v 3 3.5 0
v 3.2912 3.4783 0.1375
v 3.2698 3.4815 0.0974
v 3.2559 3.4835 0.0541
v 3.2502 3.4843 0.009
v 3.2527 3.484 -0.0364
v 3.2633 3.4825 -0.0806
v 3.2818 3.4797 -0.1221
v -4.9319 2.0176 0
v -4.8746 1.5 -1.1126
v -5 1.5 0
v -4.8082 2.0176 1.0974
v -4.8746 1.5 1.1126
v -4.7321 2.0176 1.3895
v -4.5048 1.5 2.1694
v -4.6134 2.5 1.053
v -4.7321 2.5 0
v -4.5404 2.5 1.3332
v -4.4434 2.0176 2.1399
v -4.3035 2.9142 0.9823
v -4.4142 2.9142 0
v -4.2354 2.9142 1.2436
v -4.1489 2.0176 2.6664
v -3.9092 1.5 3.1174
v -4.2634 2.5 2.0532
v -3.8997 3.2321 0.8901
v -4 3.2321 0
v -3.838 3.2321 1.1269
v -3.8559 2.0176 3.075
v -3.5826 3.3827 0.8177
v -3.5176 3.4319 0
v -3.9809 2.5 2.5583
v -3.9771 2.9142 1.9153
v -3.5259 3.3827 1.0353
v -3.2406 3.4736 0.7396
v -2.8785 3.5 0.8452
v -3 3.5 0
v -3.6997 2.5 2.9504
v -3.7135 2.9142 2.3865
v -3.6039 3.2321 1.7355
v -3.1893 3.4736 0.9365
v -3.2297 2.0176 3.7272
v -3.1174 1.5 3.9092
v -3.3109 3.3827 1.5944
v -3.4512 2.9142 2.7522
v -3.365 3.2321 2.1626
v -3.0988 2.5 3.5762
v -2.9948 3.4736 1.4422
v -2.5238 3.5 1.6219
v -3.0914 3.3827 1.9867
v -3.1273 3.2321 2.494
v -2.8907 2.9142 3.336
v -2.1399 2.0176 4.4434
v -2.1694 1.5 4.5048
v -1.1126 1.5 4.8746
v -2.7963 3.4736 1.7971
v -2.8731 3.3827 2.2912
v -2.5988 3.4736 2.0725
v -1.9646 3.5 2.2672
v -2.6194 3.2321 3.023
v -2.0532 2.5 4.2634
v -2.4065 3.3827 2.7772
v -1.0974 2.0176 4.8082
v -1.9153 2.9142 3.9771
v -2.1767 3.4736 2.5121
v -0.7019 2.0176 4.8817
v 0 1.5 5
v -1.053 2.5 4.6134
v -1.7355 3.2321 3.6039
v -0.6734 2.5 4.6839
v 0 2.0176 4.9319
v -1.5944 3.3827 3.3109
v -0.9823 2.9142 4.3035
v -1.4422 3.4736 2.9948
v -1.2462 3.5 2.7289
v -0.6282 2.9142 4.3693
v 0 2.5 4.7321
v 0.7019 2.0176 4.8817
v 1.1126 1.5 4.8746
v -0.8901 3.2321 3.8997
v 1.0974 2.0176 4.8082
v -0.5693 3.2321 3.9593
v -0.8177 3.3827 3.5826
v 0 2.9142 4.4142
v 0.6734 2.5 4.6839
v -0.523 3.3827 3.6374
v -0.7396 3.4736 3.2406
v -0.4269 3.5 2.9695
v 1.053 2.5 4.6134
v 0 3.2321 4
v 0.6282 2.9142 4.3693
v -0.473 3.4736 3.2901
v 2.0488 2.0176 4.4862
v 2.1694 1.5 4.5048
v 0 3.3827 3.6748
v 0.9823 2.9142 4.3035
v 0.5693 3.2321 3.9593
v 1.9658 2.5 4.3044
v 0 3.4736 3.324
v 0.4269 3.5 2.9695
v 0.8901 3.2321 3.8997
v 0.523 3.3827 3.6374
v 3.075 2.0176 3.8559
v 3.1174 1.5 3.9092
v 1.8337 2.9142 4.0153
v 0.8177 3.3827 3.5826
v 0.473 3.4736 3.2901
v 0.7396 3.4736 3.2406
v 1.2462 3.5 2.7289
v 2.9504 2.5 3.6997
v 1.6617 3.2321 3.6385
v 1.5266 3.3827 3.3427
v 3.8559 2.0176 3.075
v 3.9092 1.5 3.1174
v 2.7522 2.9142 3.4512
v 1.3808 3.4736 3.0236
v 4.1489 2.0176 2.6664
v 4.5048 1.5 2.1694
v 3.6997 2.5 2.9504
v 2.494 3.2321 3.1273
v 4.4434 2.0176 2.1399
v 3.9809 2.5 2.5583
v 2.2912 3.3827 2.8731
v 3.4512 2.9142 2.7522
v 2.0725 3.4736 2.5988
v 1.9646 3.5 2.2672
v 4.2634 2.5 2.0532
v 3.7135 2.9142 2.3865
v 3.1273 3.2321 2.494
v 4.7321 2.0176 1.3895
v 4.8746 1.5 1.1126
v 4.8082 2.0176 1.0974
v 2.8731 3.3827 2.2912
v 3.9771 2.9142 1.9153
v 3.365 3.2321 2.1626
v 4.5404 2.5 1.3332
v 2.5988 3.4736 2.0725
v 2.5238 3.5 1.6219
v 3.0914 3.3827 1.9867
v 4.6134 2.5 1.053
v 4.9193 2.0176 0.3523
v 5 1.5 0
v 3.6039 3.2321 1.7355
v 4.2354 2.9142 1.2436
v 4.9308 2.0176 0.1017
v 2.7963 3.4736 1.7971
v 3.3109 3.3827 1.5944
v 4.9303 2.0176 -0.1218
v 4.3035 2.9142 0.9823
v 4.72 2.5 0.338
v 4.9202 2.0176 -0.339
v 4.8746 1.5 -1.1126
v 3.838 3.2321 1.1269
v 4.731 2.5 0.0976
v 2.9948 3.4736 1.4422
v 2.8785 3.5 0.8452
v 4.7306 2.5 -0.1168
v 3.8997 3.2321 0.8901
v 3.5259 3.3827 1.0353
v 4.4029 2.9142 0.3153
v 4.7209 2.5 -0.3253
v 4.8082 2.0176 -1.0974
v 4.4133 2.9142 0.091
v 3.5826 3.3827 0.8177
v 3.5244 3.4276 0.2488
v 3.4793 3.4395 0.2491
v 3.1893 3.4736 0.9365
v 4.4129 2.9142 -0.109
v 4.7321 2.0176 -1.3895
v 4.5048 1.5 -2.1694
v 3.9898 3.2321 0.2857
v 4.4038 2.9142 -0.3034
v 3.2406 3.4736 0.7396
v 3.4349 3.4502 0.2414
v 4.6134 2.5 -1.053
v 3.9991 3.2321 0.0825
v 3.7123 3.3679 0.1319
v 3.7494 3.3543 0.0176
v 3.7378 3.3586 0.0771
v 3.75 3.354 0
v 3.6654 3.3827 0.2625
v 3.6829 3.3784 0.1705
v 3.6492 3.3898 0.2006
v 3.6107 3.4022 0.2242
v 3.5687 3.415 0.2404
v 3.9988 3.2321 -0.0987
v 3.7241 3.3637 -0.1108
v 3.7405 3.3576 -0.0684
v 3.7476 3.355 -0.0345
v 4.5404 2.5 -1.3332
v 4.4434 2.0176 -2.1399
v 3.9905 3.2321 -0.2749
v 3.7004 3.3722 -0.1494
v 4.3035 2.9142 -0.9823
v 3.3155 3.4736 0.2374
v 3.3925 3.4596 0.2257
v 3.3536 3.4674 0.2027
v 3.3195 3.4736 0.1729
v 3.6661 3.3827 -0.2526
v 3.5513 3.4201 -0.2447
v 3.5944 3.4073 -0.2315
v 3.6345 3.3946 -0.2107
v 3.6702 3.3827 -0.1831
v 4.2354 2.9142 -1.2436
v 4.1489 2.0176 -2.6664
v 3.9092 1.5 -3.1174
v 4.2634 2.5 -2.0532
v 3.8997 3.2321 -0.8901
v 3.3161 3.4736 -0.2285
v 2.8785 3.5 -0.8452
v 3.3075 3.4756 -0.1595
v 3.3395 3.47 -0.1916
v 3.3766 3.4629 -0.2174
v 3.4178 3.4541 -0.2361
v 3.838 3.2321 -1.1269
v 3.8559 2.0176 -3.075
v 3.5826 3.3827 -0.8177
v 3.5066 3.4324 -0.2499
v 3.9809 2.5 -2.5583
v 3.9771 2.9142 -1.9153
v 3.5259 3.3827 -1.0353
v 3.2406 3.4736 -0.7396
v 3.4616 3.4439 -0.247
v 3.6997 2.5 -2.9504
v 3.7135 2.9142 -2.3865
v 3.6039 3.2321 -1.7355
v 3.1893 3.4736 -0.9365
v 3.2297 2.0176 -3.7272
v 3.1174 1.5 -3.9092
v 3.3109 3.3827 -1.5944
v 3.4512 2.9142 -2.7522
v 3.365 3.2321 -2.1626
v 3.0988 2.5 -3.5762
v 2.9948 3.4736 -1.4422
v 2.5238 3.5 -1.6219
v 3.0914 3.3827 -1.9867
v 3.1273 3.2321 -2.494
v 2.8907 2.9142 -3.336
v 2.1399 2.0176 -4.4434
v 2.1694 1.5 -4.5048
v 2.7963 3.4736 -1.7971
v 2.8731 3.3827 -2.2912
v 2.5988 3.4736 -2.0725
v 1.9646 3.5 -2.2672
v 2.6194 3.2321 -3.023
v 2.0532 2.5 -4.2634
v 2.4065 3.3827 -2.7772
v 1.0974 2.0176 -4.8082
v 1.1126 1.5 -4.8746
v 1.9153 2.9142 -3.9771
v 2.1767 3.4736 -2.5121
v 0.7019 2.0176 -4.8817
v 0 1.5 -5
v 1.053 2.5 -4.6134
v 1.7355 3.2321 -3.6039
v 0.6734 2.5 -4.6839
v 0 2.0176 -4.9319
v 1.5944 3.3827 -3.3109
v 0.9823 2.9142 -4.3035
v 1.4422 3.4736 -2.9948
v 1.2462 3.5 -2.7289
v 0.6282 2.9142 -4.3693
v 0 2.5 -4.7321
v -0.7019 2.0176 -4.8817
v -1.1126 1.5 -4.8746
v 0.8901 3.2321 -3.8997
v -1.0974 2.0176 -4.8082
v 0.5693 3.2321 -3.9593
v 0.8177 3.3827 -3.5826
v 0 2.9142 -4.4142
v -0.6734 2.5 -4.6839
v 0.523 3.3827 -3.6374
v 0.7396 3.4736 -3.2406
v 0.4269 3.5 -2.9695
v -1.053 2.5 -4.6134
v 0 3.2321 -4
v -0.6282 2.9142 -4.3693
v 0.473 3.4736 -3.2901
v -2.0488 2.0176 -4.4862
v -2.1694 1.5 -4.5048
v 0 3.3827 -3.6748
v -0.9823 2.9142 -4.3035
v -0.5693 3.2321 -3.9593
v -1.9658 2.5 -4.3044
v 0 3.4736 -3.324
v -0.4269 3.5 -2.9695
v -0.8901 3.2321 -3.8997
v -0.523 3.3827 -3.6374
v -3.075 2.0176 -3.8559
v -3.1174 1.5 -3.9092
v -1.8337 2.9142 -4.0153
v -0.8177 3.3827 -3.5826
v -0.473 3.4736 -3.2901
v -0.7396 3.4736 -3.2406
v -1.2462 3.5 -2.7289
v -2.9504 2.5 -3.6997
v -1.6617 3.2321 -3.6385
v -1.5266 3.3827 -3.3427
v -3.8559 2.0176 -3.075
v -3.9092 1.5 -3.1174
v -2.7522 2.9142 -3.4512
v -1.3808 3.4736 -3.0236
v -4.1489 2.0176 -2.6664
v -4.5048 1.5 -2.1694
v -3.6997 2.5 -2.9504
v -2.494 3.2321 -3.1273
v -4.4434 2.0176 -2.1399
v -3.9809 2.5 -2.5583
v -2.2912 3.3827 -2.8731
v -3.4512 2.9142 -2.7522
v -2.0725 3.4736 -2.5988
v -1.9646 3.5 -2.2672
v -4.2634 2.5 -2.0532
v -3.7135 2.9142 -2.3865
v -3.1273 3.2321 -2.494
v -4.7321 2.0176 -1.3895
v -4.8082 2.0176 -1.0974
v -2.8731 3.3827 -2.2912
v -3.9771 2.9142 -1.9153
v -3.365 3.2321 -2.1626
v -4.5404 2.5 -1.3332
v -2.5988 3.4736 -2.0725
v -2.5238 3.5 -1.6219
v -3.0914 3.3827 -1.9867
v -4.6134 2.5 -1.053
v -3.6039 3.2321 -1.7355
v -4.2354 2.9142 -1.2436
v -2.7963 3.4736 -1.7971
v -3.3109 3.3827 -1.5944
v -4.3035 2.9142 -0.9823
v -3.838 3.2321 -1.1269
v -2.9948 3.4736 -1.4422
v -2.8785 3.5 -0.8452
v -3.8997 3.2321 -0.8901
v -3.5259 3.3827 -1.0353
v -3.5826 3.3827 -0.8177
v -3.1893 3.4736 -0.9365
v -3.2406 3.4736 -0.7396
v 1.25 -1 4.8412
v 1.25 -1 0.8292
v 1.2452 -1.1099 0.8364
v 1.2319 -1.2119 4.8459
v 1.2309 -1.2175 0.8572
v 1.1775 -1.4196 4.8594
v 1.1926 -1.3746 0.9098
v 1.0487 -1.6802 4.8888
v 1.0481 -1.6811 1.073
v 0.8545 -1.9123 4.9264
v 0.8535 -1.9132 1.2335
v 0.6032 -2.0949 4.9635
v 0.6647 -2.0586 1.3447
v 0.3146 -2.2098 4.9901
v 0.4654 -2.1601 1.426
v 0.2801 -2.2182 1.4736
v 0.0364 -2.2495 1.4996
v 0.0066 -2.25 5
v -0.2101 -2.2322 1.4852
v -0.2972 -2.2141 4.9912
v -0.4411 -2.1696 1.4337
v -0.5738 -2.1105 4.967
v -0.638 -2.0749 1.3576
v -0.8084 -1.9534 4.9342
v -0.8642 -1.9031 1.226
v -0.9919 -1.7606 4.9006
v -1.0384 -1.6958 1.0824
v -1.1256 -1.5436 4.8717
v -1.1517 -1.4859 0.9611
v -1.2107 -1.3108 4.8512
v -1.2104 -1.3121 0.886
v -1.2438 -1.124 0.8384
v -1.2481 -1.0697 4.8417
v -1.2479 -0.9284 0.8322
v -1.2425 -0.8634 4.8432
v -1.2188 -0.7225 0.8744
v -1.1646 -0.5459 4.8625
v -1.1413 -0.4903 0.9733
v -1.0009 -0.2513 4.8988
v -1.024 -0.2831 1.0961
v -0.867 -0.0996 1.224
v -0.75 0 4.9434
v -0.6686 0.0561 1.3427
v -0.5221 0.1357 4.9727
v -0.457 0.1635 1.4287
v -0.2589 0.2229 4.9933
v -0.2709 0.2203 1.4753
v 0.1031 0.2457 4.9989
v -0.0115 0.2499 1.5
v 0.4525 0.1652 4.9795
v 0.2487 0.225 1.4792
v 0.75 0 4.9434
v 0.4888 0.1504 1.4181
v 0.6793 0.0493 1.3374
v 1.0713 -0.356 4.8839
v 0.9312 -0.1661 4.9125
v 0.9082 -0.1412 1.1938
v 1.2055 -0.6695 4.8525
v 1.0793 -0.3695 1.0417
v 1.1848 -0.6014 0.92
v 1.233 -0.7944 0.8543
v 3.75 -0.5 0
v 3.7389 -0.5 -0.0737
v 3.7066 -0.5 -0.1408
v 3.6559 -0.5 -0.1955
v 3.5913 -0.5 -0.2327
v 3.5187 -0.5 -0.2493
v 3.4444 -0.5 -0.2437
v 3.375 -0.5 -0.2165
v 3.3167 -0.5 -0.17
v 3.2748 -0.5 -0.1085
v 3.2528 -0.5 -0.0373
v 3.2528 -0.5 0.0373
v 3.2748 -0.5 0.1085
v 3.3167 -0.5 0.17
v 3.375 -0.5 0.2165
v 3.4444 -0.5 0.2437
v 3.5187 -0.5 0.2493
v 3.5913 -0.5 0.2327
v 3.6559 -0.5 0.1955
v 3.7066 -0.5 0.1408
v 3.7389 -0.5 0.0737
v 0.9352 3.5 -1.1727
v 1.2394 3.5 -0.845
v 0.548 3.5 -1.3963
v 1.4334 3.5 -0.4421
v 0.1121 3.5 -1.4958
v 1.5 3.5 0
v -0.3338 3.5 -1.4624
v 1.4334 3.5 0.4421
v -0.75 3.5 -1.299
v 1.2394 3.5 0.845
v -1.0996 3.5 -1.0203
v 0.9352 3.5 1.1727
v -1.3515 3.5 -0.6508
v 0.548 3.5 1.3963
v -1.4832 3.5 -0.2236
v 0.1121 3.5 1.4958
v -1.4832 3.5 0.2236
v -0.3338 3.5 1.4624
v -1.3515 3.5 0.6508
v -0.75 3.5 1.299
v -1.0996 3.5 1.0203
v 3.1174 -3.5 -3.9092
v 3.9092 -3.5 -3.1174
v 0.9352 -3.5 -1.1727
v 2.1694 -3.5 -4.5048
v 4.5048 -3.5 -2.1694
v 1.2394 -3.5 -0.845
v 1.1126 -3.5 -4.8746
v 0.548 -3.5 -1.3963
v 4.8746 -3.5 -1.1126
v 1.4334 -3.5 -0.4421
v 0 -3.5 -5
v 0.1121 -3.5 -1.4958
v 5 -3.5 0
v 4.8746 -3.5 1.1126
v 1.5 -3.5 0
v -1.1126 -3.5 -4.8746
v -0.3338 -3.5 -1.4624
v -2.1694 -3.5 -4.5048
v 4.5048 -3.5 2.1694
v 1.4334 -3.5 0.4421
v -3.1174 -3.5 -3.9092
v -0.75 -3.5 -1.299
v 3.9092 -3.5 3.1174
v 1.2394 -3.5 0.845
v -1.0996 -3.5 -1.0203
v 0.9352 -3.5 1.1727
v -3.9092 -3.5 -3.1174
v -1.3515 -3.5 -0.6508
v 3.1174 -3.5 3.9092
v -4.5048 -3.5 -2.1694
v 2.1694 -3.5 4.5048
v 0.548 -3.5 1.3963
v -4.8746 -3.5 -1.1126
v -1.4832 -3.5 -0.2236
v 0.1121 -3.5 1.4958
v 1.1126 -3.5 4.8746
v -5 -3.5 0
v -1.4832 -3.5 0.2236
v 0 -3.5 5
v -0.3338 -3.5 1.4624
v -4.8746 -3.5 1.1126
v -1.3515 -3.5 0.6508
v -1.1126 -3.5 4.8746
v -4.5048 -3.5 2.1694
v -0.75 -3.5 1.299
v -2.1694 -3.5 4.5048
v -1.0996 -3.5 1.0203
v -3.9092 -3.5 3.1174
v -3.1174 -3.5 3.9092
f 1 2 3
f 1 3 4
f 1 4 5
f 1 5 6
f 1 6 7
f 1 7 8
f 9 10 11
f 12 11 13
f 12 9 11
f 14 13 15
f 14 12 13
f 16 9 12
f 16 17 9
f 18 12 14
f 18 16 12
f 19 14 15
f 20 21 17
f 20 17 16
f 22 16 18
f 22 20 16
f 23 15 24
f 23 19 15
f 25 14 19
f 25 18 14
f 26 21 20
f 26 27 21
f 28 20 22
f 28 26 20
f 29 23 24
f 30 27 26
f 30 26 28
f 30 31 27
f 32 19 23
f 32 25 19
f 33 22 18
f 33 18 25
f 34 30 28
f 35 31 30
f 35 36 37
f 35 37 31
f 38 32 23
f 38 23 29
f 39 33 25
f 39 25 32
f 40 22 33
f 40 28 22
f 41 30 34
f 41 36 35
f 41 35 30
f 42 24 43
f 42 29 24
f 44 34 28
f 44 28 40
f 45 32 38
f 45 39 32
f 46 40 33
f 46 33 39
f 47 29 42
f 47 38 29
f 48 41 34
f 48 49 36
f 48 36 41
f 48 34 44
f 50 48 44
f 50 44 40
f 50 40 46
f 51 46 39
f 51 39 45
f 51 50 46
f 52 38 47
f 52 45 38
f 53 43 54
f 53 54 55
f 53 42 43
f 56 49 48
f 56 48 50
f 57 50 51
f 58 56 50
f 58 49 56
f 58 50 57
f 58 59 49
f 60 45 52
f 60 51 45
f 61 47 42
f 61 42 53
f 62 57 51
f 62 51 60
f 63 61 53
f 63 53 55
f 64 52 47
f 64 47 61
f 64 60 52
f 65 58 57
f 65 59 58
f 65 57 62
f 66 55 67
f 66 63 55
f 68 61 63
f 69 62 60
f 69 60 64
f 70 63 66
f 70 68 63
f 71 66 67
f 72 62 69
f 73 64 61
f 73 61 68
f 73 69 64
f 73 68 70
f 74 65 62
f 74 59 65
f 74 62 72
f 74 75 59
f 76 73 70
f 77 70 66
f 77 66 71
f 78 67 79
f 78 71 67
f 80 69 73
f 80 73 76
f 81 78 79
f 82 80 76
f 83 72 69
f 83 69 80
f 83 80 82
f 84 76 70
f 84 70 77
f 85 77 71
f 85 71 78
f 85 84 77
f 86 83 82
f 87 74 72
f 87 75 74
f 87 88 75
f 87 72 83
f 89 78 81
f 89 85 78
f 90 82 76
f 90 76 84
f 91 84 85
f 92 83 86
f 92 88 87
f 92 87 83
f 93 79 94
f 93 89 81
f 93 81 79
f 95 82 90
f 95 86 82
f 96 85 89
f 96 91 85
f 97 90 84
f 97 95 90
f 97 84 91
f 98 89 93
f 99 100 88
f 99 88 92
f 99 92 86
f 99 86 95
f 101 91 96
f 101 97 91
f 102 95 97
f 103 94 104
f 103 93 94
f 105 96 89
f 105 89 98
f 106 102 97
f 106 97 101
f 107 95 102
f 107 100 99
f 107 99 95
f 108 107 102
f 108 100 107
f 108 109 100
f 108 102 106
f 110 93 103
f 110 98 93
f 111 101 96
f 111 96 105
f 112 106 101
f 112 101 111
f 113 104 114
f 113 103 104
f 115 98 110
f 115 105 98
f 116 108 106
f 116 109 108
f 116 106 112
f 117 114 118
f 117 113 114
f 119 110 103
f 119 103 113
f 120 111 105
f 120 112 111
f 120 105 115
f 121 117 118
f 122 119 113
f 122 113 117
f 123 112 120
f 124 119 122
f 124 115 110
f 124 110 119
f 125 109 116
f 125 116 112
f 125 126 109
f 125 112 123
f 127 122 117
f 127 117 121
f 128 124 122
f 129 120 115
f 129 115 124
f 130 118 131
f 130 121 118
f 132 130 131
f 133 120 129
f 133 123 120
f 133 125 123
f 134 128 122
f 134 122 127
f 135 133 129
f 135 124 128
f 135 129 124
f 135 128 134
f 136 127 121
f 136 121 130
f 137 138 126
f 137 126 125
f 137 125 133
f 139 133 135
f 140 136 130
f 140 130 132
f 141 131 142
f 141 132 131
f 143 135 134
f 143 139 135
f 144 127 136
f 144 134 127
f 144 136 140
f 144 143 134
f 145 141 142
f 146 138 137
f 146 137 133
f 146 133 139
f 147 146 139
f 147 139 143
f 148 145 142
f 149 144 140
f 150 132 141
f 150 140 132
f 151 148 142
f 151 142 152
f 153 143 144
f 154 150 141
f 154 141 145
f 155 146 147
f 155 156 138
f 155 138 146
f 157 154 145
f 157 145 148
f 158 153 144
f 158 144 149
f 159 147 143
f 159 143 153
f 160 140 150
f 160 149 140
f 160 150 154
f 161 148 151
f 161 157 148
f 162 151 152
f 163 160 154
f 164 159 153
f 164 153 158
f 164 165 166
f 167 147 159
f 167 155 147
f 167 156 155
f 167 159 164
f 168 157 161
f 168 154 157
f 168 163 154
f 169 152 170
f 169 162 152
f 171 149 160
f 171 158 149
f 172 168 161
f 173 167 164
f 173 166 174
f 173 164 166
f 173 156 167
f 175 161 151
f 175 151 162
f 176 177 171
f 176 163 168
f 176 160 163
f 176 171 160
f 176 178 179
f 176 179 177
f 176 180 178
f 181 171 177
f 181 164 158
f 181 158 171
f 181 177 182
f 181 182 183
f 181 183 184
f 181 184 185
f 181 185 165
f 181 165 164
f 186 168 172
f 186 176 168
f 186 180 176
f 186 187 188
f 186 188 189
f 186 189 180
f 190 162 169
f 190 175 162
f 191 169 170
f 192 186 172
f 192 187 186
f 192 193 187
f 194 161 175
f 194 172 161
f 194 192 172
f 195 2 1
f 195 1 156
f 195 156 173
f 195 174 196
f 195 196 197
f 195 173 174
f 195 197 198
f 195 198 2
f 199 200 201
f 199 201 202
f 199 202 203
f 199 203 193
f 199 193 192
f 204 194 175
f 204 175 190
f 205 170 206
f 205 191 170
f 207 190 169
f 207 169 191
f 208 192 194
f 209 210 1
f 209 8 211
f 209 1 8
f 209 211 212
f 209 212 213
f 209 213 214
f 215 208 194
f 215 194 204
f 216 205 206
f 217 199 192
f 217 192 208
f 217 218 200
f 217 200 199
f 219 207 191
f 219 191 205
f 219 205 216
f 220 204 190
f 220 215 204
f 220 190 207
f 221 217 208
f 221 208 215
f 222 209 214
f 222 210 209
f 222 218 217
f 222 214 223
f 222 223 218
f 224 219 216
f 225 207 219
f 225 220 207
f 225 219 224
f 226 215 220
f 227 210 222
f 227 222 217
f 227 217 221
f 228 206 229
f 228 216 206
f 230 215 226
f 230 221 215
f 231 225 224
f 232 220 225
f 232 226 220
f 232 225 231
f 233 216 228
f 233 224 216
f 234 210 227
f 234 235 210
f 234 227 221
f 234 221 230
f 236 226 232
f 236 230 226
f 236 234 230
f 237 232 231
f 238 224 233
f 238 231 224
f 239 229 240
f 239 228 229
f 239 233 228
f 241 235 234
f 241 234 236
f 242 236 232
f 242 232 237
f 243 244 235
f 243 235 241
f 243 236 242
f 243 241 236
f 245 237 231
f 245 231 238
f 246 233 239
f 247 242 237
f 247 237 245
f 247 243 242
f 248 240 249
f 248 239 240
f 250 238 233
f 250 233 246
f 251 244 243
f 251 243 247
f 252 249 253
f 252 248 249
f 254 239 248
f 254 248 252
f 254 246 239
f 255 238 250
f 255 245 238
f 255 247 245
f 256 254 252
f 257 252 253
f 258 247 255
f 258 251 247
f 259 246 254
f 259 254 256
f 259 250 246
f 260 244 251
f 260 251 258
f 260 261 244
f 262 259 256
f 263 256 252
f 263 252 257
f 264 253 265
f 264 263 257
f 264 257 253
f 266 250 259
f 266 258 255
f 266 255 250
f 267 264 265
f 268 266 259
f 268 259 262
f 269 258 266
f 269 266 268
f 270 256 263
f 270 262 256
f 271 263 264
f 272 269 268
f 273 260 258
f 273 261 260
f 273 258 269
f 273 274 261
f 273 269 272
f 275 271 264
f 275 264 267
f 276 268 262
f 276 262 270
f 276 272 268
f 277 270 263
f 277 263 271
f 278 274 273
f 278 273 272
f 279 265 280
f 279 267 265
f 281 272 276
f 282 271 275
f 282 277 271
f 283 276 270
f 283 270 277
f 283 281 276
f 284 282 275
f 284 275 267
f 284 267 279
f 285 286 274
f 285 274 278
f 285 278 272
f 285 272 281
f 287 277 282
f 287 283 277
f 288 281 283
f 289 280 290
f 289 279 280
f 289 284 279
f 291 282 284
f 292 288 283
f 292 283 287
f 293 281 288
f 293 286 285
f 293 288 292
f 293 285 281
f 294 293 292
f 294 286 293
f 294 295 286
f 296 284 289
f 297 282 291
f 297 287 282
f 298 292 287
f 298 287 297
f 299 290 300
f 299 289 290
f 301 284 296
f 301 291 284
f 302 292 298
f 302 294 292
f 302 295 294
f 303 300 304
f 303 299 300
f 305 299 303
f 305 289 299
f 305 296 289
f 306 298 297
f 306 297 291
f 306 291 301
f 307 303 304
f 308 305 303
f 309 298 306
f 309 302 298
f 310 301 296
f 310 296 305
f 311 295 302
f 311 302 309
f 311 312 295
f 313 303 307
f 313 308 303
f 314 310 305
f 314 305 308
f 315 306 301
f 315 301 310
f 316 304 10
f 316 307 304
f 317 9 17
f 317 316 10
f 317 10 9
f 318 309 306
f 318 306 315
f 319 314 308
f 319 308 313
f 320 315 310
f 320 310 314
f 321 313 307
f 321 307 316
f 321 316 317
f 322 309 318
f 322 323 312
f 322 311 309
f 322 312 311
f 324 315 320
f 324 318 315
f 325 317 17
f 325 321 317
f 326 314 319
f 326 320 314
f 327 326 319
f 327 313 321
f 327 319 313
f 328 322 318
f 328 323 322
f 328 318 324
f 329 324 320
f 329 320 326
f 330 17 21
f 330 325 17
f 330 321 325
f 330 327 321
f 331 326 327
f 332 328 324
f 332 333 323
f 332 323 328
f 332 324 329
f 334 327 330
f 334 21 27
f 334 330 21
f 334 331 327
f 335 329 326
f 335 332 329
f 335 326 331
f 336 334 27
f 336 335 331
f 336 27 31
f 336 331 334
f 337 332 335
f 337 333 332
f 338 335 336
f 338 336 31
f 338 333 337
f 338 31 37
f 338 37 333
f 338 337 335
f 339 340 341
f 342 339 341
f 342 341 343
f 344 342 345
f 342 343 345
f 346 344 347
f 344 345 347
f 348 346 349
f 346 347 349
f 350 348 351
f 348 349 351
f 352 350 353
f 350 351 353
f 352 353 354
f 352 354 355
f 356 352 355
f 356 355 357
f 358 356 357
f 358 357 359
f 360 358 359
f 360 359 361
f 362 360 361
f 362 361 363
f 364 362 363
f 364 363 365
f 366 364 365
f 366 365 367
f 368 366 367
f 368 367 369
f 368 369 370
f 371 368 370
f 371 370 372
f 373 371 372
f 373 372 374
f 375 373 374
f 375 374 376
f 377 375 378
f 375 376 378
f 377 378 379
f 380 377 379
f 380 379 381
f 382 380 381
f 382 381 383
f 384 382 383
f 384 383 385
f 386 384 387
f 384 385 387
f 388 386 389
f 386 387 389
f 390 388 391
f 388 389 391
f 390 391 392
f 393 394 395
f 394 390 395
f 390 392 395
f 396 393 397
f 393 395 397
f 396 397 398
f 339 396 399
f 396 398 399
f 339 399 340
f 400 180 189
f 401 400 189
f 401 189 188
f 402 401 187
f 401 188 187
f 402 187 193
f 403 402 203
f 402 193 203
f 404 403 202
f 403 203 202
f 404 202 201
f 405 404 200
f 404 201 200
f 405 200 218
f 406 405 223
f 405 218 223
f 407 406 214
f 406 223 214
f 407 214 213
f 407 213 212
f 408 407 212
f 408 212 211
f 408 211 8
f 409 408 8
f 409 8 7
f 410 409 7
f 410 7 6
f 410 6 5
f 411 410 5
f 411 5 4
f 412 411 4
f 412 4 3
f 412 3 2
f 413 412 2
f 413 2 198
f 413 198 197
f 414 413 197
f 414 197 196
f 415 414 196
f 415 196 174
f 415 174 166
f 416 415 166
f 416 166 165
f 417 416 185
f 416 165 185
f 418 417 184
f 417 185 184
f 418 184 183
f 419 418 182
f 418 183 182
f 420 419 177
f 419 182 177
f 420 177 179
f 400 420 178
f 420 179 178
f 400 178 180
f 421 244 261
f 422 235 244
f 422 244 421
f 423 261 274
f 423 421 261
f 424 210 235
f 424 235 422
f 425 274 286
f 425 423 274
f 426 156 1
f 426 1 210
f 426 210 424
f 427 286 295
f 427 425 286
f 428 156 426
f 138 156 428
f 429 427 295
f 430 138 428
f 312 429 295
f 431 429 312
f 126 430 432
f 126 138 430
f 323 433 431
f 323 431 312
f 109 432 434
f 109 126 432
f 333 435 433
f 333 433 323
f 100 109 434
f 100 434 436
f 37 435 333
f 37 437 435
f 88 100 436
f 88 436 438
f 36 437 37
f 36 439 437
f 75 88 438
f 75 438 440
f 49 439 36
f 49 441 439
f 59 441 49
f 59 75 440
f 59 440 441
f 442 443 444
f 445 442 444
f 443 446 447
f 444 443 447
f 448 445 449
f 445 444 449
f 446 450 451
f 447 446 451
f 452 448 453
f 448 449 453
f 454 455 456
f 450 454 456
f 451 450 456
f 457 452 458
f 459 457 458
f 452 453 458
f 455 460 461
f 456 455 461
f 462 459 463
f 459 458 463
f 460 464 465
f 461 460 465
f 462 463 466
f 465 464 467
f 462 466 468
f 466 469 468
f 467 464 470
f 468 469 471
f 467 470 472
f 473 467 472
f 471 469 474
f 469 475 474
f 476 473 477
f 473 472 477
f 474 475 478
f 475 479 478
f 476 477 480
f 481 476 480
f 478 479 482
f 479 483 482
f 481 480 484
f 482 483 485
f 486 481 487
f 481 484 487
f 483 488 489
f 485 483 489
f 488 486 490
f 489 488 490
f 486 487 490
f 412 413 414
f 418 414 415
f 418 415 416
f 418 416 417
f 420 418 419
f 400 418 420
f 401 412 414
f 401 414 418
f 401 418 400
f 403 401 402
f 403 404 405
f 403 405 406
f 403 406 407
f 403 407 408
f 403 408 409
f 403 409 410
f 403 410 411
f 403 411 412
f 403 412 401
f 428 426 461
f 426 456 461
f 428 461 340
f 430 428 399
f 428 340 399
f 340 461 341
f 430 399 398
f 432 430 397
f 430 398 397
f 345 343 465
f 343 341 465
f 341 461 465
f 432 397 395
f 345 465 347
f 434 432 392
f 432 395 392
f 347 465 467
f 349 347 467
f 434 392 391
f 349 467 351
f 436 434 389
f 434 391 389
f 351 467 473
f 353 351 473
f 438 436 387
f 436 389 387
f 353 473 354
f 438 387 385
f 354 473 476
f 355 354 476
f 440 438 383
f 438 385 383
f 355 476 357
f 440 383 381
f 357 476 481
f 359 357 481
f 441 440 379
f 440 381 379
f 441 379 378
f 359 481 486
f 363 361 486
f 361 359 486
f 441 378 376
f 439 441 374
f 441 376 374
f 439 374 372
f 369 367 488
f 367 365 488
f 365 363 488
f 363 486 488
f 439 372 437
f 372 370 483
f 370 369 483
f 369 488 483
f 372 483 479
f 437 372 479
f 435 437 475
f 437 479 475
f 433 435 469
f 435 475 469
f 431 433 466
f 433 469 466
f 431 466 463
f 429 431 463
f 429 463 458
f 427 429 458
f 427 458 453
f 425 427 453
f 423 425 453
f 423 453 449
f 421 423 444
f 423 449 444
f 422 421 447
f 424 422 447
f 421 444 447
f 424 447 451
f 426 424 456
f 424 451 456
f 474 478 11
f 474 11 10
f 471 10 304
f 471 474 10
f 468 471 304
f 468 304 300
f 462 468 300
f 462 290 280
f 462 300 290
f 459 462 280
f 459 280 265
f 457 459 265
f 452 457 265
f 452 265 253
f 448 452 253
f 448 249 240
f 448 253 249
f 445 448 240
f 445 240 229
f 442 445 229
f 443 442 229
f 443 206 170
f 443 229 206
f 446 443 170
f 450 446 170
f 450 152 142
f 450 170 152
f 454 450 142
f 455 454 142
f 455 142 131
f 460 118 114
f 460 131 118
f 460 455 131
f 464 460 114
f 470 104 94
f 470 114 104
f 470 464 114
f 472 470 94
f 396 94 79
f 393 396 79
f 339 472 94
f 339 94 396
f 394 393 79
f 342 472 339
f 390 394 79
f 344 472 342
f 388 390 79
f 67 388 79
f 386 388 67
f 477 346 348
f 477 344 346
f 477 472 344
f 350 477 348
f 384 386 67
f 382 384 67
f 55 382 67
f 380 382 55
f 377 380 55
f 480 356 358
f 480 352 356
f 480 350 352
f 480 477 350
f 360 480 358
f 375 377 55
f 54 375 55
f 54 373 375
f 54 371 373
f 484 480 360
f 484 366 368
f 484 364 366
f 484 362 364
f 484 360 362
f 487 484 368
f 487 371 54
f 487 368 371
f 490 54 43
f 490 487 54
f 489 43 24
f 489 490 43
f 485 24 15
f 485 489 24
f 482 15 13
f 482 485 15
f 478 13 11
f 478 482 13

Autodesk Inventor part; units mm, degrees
ref_plane "YZ Plane" through (0, 0, 0) normal (1, 0, 0) x (0, 1, 0)
ref_plane "XZ Plane" through (0, 0, 0) normal (0, 1, 0) x (-1, 0, 0)
sketch "Sketch1" plane through (0, 0, 0) normal (0, 1, 0) x (-1, 0, 0)
  circle A0 centre (0, 0) radius 5
  dimension "Diameter" = 10
extrude "Extrusion1" add sketch "Sketch1" along normal mid plane 7
fillet "Fillet1" radius 2 1 edges at (5, 3.5, 0)
sketch "Sketch2" plane through (0, -3.5, 0) normal (0, -1, 0) x (1, 0, 0)
  circle A0 centre (0, 0) radius 1.5
  dimension "d4" = 3
extrude "Extrusion2" cut sketch "Sketch2" against normal through all
sketch "Sketch3" plane through (0, 0, 0) normal (0, 0, 1) x (1, 0, 0)
  circle A0 centre (0, -1) radius 1.25
  line L0 (-5, -3.5) -> (5, -3.5) projected
  point P0 (0, 0)
  dimension "d7" = 2.5
  dimension "d8" = 2.5
extrude "Extrusion3" cut sketch "Sketch3" along normal blind 7
ref_plane "Work Plane1" through (0, 8.5, 0) normal (0, 1, 0) x (1, 0, 0)
sketch "Sketch4" plane through (0, 8.5, 0) normal (0, 1, 0) x (1, 0, 0)
  circle A0 centre (3.5, 0) radius 0.25
  point P0 (0, 0)
  dimension "d12" = 0.5
  dimension "d13" = 3.5
extrude "Extrusion4" cut sketch "Sketch4" against normal blind 9
thread "Thread1" size "M3x0.5" class "6H" standard "ANSI Metric M Profile" length 5
properties part number "Lower Lock Cap" material "Mild Steel S355 J2"
